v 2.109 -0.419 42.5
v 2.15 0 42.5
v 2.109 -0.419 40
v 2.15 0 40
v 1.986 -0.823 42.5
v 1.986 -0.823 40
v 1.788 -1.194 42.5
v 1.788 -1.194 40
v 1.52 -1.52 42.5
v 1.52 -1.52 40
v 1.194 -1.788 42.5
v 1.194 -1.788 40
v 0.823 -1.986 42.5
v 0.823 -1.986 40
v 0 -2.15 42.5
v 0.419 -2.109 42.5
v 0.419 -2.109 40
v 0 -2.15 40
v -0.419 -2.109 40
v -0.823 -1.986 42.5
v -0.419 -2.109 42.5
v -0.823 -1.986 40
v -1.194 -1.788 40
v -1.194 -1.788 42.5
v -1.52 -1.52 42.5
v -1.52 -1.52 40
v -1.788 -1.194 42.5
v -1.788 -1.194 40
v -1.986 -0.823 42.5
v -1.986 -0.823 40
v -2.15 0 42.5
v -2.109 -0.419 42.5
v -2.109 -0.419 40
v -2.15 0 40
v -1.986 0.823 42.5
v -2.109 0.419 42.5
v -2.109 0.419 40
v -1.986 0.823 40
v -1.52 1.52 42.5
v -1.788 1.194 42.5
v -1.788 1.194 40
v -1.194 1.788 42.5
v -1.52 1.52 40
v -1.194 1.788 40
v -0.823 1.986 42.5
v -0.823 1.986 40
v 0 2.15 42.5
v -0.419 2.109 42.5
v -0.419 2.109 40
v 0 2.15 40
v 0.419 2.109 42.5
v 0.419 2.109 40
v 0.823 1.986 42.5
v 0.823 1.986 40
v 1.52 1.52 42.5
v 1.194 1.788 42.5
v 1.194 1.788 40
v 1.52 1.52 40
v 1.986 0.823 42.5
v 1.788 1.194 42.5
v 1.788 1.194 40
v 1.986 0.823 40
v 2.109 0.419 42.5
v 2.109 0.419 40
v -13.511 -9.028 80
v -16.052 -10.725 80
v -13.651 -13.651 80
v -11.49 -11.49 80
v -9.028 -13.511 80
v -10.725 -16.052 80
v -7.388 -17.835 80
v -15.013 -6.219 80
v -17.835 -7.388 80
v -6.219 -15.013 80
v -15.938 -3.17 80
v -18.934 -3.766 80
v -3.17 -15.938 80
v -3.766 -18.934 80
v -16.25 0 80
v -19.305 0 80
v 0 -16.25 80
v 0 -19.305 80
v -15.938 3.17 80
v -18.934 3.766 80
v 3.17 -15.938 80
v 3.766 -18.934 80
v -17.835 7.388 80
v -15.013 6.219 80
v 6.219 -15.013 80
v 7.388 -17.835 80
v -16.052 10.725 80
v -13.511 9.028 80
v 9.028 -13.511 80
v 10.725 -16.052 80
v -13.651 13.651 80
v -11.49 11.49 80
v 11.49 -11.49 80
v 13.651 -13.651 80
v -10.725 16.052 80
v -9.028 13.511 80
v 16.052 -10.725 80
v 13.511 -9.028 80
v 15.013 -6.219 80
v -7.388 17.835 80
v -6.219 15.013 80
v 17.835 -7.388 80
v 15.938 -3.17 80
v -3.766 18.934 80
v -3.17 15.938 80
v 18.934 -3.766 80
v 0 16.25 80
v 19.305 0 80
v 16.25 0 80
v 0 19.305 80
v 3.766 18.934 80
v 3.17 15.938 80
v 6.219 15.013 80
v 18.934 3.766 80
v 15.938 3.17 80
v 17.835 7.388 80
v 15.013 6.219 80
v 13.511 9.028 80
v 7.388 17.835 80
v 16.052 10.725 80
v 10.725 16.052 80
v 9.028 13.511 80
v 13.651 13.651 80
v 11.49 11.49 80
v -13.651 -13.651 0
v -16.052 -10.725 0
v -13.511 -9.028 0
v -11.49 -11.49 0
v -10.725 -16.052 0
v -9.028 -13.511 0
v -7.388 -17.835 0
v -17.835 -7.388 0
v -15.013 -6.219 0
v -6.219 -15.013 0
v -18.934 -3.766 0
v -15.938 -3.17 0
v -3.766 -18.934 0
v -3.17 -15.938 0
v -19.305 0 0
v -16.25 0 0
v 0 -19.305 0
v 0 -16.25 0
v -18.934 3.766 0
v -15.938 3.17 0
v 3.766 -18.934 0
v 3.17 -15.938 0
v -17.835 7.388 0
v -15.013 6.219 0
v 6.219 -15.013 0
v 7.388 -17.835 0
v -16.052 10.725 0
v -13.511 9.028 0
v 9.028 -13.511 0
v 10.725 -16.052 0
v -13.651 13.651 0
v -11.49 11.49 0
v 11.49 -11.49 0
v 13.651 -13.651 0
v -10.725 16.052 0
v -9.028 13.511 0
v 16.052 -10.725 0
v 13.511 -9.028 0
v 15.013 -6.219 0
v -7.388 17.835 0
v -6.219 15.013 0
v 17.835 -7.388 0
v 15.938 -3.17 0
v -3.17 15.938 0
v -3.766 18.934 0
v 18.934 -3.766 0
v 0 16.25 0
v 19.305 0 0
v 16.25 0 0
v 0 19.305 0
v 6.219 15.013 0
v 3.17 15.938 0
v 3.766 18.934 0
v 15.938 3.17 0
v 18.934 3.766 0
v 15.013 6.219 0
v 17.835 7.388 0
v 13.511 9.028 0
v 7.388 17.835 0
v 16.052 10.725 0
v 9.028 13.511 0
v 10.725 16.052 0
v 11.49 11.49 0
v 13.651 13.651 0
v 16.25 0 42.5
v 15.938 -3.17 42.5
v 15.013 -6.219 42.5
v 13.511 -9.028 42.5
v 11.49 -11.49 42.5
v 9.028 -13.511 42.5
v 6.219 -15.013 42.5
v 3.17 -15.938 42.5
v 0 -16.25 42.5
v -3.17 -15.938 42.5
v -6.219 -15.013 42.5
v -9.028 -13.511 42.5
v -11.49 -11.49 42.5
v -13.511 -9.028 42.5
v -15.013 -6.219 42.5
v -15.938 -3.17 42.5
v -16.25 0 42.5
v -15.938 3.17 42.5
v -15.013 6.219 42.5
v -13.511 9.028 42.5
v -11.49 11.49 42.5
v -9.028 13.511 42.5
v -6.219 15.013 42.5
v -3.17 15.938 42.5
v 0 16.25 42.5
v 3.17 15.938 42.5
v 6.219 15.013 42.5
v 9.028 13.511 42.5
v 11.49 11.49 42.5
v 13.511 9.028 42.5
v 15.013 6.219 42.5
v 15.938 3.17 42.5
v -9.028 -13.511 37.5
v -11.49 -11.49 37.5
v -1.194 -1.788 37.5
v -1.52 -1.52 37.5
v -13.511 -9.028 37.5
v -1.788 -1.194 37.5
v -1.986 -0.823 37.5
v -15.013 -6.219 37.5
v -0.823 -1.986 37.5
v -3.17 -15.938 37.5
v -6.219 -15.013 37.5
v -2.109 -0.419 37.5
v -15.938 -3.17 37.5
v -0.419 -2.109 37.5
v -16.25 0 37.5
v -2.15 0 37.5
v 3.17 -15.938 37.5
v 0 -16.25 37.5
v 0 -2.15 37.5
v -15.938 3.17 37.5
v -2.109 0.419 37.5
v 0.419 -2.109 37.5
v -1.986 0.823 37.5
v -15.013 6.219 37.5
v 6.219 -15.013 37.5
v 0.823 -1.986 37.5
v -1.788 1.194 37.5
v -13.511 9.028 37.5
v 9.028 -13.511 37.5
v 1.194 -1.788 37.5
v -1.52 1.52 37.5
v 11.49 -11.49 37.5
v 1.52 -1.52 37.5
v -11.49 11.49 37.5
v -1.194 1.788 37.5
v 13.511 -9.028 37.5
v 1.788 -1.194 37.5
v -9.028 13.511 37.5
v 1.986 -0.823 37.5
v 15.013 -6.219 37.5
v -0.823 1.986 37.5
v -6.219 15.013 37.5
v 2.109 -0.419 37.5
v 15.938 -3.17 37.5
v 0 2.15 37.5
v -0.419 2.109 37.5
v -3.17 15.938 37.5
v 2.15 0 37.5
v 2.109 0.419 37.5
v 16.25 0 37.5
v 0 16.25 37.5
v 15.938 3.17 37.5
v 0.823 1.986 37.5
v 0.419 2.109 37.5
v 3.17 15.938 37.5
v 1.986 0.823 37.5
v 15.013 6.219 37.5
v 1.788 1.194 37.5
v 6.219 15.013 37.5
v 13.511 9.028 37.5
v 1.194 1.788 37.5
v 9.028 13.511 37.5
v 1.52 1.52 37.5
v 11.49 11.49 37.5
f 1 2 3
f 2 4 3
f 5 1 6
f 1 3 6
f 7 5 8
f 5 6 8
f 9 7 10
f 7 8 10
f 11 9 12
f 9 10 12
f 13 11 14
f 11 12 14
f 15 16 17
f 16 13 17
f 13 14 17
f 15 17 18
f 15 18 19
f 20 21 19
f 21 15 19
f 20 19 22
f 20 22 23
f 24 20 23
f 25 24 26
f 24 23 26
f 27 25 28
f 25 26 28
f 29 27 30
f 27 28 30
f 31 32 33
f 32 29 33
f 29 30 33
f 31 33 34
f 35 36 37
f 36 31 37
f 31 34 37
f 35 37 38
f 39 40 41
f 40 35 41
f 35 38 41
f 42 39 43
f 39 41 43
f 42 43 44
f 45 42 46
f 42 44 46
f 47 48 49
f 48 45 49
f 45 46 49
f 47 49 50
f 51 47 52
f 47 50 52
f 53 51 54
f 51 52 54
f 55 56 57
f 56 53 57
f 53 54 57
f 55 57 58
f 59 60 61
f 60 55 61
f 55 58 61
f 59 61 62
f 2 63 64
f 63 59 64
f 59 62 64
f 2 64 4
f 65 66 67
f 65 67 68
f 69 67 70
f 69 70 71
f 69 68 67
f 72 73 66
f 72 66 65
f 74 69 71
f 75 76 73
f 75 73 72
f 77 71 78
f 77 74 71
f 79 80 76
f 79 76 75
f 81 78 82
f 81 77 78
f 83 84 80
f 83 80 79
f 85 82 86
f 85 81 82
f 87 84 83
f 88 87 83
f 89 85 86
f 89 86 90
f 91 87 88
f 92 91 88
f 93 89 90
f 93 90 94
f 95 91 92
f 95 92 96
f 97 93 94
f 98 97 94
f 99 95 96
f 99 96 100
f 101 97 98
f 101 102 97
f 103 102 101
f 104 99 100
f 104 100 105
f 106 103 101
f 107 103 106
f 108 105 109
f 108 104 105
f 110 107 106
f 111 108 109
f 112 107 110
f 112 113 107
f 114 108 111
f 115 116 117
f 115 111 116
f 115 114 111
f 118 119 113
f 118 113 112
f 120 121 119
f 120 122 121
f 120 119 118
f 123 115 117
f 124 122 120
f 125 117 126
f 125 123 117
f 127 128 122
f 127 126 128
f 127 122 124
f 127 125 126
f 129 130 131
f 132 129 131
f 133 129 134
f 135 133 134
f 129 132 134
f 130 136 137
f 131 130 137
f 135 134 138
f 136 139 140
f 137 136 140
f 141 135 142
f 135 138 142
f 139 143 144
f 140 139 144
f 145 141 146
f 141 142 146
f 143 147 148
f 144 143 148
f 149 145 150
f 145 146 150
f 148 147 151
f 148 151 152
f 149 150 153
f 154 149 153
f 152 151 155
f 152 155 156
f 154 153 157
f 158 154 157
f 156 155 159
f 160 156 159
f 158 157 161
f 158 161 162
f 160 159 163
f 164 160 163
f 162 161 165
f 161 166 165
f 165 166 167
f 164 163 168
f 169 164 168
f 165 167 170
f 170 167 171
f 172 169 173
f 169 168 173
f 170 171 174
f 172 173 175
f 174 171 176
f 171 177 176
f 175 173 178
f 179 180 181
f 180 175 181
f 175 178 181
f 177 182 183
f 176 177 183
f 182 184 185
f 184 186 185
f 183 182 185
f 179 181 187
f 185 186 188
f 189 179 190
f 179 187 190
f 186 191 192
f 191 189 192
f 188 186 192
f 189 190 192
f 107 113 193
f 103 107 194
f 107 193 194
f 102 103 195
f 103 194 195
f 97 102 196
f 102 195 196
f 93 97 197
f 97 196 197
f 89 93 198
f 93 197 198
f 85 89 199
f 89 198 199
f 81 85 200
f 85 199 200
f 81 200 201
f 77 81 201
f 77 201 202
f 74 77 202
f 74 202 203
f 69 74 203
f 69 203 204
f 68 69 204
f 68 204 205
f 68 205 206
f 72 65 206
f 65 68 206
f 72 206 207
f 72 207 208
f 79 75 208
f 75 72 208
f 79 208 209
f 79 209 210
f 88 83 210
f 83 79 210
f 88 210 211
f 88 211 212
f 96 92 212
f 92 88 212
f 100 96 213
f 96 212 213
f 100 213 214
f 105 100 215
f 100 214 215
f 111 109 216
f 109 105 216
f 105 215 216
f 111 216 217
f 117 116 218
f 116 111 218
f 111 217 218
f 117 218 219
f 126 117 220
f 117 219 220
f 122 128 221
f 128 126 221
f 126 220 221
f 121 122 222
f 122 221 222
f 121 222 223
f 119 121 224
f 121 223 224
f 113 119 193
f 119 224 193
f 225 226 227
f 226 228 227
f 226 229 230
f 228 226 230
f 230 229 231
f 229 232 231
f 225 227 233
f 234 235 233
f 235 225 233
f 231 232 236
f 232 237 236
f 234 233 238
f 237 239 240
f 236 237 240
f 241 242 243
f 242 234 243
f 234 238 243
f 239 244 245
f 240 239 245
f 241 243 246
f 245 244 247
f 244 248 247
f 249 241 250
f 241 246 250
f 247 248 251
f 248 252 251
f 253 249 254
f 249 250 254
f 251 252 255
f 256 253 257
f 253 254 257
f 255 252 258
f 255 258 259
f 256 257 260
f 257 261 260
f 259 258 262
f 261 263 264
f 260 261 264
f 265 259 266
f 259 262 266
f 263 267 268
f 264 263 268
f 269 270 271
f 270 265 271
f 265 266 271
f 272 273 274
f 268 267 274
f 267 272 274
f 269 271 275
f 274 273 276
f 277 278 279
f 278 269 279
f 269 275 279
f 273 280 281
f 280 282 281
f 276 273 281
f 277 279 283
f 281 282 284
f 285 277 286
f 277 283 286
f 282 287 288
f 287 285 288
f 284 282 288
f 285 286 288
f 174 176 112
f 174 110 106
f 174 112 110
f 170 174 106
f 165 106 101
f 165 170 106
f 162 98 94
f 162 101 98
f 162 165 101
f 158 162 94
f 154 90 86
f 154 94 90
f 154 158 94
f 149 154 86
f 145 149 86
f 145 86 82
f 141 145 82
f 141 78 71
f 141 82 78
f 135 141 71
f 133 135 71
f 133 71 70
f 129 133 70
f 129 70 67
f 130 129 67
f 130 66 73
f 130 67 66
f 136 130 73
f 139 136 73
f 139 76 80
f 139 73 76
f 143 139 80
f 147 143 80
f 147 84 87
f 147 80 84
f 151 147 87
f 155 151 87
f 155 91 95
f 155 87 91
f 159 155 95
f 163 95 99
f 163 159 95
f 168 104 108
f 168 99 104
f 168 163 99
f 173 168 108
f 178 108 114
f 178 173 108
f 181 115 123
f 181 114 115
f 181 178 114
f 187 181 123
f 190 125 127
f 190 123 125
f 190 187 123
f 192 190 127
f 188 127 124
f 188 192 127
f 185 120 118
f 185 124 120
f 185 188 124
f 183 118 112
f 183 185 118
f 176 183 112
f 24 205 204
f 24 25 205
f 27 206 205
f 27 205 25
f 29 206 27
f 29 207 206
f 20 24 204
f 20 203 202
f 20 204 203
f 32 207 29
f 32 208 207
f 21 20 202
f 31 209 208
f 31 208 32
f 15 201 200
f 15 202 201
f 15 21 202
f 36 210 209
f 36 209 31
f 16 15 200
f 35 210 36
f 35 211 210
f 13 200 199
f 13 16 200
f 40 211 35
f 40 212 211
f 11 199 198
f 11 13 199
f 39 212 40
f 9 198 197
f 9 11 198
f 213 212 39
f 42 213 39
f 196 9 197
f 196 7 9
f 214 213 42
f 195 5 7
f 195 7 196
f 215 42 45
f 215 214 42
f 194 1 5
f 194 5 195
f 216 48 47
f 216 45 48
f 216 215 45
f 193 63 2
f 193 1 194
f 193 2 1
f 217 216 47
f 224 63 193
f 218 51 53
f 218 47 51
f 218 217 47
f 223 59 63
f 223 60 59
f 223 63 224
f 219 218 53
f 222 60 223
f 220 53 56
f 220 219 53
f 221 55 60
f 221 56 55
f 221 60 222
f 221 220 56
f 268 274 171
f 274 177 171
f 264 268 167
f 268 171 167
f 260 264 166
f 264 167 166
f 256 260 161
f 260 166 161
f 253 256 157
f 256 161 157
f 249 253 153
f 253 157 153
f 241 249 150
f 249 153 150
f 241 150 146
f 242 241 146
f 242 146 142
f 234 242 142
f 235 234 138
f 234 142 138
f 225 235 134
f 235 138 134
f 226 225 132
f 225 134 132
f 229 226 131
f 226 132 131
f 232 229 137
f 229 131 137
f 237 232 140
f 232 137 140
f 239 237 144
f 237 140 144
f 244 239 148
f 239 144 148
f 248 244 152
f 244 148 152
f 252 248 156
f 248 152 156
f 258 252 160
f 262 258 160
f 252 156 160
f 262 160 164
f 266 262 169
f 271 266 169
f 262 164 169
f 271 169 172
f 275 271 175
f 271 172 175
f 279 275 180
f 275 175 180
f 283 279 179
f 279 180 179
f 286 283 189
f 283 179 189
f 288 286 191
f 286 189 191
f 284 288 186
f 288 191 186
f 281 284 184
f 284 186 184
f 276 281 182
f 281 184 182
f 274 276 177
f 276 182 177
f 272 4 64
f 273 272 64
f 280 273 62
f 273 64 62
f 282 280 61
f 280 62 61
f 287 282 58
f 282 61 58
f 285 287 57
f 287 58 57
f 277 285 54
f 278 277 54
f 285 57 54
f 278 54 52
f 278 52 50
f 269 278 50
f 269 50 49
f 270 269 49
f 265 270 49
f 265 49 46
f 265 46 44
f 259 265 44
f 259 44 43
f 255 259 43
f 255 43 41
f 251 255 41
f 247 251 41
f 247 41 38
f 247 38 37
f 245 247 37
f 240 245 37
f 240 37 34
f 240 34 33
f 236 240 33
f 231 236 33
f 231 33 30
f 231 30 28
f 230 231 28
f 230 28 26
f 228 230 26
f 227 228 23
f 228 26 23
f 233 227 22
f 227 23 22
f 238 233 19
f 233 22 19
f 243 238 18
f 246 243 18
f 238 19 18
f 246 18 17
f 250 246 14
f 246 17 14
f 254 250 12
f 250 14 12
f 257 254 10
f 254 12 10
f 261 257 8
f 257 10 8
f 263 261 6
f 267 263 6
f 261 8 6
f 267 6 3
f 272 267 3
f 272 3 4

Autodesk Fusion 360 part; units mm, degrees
sketch "Sketch1" plane through (0, 0, 0) normal (0, 0, 1) x (1, 0, 0)
  circle A0 centre (0, 0) radius 19.305
  circle A1 centre (0, 0) radius 16.25
  dimension "d1" = 38.61
  dimension "d9" = 32.5
extrude "Extrude1" add sketch "Sketch1" along normal blind 80 makes body 1
ref_plane "WorkPlane1" through (0, 0, 40) normal (0, 0, 1) x (1, 0, 0)
sketch "Sketch2" plane through (0, 0, 40) normal (0, 0, 1) x (1, 0, 0)
  circle A0 centre (0, 0) radius 18.6687
  circle A1 centre (0, 0) radius 2.15
  dimension "d6" = 4.3
extrude "Extrude2" add sketch "Sketch2" along normal mid plane 5 separate body makes body 2
combine "Combine1" operation add target body 1 tool bodies 2
